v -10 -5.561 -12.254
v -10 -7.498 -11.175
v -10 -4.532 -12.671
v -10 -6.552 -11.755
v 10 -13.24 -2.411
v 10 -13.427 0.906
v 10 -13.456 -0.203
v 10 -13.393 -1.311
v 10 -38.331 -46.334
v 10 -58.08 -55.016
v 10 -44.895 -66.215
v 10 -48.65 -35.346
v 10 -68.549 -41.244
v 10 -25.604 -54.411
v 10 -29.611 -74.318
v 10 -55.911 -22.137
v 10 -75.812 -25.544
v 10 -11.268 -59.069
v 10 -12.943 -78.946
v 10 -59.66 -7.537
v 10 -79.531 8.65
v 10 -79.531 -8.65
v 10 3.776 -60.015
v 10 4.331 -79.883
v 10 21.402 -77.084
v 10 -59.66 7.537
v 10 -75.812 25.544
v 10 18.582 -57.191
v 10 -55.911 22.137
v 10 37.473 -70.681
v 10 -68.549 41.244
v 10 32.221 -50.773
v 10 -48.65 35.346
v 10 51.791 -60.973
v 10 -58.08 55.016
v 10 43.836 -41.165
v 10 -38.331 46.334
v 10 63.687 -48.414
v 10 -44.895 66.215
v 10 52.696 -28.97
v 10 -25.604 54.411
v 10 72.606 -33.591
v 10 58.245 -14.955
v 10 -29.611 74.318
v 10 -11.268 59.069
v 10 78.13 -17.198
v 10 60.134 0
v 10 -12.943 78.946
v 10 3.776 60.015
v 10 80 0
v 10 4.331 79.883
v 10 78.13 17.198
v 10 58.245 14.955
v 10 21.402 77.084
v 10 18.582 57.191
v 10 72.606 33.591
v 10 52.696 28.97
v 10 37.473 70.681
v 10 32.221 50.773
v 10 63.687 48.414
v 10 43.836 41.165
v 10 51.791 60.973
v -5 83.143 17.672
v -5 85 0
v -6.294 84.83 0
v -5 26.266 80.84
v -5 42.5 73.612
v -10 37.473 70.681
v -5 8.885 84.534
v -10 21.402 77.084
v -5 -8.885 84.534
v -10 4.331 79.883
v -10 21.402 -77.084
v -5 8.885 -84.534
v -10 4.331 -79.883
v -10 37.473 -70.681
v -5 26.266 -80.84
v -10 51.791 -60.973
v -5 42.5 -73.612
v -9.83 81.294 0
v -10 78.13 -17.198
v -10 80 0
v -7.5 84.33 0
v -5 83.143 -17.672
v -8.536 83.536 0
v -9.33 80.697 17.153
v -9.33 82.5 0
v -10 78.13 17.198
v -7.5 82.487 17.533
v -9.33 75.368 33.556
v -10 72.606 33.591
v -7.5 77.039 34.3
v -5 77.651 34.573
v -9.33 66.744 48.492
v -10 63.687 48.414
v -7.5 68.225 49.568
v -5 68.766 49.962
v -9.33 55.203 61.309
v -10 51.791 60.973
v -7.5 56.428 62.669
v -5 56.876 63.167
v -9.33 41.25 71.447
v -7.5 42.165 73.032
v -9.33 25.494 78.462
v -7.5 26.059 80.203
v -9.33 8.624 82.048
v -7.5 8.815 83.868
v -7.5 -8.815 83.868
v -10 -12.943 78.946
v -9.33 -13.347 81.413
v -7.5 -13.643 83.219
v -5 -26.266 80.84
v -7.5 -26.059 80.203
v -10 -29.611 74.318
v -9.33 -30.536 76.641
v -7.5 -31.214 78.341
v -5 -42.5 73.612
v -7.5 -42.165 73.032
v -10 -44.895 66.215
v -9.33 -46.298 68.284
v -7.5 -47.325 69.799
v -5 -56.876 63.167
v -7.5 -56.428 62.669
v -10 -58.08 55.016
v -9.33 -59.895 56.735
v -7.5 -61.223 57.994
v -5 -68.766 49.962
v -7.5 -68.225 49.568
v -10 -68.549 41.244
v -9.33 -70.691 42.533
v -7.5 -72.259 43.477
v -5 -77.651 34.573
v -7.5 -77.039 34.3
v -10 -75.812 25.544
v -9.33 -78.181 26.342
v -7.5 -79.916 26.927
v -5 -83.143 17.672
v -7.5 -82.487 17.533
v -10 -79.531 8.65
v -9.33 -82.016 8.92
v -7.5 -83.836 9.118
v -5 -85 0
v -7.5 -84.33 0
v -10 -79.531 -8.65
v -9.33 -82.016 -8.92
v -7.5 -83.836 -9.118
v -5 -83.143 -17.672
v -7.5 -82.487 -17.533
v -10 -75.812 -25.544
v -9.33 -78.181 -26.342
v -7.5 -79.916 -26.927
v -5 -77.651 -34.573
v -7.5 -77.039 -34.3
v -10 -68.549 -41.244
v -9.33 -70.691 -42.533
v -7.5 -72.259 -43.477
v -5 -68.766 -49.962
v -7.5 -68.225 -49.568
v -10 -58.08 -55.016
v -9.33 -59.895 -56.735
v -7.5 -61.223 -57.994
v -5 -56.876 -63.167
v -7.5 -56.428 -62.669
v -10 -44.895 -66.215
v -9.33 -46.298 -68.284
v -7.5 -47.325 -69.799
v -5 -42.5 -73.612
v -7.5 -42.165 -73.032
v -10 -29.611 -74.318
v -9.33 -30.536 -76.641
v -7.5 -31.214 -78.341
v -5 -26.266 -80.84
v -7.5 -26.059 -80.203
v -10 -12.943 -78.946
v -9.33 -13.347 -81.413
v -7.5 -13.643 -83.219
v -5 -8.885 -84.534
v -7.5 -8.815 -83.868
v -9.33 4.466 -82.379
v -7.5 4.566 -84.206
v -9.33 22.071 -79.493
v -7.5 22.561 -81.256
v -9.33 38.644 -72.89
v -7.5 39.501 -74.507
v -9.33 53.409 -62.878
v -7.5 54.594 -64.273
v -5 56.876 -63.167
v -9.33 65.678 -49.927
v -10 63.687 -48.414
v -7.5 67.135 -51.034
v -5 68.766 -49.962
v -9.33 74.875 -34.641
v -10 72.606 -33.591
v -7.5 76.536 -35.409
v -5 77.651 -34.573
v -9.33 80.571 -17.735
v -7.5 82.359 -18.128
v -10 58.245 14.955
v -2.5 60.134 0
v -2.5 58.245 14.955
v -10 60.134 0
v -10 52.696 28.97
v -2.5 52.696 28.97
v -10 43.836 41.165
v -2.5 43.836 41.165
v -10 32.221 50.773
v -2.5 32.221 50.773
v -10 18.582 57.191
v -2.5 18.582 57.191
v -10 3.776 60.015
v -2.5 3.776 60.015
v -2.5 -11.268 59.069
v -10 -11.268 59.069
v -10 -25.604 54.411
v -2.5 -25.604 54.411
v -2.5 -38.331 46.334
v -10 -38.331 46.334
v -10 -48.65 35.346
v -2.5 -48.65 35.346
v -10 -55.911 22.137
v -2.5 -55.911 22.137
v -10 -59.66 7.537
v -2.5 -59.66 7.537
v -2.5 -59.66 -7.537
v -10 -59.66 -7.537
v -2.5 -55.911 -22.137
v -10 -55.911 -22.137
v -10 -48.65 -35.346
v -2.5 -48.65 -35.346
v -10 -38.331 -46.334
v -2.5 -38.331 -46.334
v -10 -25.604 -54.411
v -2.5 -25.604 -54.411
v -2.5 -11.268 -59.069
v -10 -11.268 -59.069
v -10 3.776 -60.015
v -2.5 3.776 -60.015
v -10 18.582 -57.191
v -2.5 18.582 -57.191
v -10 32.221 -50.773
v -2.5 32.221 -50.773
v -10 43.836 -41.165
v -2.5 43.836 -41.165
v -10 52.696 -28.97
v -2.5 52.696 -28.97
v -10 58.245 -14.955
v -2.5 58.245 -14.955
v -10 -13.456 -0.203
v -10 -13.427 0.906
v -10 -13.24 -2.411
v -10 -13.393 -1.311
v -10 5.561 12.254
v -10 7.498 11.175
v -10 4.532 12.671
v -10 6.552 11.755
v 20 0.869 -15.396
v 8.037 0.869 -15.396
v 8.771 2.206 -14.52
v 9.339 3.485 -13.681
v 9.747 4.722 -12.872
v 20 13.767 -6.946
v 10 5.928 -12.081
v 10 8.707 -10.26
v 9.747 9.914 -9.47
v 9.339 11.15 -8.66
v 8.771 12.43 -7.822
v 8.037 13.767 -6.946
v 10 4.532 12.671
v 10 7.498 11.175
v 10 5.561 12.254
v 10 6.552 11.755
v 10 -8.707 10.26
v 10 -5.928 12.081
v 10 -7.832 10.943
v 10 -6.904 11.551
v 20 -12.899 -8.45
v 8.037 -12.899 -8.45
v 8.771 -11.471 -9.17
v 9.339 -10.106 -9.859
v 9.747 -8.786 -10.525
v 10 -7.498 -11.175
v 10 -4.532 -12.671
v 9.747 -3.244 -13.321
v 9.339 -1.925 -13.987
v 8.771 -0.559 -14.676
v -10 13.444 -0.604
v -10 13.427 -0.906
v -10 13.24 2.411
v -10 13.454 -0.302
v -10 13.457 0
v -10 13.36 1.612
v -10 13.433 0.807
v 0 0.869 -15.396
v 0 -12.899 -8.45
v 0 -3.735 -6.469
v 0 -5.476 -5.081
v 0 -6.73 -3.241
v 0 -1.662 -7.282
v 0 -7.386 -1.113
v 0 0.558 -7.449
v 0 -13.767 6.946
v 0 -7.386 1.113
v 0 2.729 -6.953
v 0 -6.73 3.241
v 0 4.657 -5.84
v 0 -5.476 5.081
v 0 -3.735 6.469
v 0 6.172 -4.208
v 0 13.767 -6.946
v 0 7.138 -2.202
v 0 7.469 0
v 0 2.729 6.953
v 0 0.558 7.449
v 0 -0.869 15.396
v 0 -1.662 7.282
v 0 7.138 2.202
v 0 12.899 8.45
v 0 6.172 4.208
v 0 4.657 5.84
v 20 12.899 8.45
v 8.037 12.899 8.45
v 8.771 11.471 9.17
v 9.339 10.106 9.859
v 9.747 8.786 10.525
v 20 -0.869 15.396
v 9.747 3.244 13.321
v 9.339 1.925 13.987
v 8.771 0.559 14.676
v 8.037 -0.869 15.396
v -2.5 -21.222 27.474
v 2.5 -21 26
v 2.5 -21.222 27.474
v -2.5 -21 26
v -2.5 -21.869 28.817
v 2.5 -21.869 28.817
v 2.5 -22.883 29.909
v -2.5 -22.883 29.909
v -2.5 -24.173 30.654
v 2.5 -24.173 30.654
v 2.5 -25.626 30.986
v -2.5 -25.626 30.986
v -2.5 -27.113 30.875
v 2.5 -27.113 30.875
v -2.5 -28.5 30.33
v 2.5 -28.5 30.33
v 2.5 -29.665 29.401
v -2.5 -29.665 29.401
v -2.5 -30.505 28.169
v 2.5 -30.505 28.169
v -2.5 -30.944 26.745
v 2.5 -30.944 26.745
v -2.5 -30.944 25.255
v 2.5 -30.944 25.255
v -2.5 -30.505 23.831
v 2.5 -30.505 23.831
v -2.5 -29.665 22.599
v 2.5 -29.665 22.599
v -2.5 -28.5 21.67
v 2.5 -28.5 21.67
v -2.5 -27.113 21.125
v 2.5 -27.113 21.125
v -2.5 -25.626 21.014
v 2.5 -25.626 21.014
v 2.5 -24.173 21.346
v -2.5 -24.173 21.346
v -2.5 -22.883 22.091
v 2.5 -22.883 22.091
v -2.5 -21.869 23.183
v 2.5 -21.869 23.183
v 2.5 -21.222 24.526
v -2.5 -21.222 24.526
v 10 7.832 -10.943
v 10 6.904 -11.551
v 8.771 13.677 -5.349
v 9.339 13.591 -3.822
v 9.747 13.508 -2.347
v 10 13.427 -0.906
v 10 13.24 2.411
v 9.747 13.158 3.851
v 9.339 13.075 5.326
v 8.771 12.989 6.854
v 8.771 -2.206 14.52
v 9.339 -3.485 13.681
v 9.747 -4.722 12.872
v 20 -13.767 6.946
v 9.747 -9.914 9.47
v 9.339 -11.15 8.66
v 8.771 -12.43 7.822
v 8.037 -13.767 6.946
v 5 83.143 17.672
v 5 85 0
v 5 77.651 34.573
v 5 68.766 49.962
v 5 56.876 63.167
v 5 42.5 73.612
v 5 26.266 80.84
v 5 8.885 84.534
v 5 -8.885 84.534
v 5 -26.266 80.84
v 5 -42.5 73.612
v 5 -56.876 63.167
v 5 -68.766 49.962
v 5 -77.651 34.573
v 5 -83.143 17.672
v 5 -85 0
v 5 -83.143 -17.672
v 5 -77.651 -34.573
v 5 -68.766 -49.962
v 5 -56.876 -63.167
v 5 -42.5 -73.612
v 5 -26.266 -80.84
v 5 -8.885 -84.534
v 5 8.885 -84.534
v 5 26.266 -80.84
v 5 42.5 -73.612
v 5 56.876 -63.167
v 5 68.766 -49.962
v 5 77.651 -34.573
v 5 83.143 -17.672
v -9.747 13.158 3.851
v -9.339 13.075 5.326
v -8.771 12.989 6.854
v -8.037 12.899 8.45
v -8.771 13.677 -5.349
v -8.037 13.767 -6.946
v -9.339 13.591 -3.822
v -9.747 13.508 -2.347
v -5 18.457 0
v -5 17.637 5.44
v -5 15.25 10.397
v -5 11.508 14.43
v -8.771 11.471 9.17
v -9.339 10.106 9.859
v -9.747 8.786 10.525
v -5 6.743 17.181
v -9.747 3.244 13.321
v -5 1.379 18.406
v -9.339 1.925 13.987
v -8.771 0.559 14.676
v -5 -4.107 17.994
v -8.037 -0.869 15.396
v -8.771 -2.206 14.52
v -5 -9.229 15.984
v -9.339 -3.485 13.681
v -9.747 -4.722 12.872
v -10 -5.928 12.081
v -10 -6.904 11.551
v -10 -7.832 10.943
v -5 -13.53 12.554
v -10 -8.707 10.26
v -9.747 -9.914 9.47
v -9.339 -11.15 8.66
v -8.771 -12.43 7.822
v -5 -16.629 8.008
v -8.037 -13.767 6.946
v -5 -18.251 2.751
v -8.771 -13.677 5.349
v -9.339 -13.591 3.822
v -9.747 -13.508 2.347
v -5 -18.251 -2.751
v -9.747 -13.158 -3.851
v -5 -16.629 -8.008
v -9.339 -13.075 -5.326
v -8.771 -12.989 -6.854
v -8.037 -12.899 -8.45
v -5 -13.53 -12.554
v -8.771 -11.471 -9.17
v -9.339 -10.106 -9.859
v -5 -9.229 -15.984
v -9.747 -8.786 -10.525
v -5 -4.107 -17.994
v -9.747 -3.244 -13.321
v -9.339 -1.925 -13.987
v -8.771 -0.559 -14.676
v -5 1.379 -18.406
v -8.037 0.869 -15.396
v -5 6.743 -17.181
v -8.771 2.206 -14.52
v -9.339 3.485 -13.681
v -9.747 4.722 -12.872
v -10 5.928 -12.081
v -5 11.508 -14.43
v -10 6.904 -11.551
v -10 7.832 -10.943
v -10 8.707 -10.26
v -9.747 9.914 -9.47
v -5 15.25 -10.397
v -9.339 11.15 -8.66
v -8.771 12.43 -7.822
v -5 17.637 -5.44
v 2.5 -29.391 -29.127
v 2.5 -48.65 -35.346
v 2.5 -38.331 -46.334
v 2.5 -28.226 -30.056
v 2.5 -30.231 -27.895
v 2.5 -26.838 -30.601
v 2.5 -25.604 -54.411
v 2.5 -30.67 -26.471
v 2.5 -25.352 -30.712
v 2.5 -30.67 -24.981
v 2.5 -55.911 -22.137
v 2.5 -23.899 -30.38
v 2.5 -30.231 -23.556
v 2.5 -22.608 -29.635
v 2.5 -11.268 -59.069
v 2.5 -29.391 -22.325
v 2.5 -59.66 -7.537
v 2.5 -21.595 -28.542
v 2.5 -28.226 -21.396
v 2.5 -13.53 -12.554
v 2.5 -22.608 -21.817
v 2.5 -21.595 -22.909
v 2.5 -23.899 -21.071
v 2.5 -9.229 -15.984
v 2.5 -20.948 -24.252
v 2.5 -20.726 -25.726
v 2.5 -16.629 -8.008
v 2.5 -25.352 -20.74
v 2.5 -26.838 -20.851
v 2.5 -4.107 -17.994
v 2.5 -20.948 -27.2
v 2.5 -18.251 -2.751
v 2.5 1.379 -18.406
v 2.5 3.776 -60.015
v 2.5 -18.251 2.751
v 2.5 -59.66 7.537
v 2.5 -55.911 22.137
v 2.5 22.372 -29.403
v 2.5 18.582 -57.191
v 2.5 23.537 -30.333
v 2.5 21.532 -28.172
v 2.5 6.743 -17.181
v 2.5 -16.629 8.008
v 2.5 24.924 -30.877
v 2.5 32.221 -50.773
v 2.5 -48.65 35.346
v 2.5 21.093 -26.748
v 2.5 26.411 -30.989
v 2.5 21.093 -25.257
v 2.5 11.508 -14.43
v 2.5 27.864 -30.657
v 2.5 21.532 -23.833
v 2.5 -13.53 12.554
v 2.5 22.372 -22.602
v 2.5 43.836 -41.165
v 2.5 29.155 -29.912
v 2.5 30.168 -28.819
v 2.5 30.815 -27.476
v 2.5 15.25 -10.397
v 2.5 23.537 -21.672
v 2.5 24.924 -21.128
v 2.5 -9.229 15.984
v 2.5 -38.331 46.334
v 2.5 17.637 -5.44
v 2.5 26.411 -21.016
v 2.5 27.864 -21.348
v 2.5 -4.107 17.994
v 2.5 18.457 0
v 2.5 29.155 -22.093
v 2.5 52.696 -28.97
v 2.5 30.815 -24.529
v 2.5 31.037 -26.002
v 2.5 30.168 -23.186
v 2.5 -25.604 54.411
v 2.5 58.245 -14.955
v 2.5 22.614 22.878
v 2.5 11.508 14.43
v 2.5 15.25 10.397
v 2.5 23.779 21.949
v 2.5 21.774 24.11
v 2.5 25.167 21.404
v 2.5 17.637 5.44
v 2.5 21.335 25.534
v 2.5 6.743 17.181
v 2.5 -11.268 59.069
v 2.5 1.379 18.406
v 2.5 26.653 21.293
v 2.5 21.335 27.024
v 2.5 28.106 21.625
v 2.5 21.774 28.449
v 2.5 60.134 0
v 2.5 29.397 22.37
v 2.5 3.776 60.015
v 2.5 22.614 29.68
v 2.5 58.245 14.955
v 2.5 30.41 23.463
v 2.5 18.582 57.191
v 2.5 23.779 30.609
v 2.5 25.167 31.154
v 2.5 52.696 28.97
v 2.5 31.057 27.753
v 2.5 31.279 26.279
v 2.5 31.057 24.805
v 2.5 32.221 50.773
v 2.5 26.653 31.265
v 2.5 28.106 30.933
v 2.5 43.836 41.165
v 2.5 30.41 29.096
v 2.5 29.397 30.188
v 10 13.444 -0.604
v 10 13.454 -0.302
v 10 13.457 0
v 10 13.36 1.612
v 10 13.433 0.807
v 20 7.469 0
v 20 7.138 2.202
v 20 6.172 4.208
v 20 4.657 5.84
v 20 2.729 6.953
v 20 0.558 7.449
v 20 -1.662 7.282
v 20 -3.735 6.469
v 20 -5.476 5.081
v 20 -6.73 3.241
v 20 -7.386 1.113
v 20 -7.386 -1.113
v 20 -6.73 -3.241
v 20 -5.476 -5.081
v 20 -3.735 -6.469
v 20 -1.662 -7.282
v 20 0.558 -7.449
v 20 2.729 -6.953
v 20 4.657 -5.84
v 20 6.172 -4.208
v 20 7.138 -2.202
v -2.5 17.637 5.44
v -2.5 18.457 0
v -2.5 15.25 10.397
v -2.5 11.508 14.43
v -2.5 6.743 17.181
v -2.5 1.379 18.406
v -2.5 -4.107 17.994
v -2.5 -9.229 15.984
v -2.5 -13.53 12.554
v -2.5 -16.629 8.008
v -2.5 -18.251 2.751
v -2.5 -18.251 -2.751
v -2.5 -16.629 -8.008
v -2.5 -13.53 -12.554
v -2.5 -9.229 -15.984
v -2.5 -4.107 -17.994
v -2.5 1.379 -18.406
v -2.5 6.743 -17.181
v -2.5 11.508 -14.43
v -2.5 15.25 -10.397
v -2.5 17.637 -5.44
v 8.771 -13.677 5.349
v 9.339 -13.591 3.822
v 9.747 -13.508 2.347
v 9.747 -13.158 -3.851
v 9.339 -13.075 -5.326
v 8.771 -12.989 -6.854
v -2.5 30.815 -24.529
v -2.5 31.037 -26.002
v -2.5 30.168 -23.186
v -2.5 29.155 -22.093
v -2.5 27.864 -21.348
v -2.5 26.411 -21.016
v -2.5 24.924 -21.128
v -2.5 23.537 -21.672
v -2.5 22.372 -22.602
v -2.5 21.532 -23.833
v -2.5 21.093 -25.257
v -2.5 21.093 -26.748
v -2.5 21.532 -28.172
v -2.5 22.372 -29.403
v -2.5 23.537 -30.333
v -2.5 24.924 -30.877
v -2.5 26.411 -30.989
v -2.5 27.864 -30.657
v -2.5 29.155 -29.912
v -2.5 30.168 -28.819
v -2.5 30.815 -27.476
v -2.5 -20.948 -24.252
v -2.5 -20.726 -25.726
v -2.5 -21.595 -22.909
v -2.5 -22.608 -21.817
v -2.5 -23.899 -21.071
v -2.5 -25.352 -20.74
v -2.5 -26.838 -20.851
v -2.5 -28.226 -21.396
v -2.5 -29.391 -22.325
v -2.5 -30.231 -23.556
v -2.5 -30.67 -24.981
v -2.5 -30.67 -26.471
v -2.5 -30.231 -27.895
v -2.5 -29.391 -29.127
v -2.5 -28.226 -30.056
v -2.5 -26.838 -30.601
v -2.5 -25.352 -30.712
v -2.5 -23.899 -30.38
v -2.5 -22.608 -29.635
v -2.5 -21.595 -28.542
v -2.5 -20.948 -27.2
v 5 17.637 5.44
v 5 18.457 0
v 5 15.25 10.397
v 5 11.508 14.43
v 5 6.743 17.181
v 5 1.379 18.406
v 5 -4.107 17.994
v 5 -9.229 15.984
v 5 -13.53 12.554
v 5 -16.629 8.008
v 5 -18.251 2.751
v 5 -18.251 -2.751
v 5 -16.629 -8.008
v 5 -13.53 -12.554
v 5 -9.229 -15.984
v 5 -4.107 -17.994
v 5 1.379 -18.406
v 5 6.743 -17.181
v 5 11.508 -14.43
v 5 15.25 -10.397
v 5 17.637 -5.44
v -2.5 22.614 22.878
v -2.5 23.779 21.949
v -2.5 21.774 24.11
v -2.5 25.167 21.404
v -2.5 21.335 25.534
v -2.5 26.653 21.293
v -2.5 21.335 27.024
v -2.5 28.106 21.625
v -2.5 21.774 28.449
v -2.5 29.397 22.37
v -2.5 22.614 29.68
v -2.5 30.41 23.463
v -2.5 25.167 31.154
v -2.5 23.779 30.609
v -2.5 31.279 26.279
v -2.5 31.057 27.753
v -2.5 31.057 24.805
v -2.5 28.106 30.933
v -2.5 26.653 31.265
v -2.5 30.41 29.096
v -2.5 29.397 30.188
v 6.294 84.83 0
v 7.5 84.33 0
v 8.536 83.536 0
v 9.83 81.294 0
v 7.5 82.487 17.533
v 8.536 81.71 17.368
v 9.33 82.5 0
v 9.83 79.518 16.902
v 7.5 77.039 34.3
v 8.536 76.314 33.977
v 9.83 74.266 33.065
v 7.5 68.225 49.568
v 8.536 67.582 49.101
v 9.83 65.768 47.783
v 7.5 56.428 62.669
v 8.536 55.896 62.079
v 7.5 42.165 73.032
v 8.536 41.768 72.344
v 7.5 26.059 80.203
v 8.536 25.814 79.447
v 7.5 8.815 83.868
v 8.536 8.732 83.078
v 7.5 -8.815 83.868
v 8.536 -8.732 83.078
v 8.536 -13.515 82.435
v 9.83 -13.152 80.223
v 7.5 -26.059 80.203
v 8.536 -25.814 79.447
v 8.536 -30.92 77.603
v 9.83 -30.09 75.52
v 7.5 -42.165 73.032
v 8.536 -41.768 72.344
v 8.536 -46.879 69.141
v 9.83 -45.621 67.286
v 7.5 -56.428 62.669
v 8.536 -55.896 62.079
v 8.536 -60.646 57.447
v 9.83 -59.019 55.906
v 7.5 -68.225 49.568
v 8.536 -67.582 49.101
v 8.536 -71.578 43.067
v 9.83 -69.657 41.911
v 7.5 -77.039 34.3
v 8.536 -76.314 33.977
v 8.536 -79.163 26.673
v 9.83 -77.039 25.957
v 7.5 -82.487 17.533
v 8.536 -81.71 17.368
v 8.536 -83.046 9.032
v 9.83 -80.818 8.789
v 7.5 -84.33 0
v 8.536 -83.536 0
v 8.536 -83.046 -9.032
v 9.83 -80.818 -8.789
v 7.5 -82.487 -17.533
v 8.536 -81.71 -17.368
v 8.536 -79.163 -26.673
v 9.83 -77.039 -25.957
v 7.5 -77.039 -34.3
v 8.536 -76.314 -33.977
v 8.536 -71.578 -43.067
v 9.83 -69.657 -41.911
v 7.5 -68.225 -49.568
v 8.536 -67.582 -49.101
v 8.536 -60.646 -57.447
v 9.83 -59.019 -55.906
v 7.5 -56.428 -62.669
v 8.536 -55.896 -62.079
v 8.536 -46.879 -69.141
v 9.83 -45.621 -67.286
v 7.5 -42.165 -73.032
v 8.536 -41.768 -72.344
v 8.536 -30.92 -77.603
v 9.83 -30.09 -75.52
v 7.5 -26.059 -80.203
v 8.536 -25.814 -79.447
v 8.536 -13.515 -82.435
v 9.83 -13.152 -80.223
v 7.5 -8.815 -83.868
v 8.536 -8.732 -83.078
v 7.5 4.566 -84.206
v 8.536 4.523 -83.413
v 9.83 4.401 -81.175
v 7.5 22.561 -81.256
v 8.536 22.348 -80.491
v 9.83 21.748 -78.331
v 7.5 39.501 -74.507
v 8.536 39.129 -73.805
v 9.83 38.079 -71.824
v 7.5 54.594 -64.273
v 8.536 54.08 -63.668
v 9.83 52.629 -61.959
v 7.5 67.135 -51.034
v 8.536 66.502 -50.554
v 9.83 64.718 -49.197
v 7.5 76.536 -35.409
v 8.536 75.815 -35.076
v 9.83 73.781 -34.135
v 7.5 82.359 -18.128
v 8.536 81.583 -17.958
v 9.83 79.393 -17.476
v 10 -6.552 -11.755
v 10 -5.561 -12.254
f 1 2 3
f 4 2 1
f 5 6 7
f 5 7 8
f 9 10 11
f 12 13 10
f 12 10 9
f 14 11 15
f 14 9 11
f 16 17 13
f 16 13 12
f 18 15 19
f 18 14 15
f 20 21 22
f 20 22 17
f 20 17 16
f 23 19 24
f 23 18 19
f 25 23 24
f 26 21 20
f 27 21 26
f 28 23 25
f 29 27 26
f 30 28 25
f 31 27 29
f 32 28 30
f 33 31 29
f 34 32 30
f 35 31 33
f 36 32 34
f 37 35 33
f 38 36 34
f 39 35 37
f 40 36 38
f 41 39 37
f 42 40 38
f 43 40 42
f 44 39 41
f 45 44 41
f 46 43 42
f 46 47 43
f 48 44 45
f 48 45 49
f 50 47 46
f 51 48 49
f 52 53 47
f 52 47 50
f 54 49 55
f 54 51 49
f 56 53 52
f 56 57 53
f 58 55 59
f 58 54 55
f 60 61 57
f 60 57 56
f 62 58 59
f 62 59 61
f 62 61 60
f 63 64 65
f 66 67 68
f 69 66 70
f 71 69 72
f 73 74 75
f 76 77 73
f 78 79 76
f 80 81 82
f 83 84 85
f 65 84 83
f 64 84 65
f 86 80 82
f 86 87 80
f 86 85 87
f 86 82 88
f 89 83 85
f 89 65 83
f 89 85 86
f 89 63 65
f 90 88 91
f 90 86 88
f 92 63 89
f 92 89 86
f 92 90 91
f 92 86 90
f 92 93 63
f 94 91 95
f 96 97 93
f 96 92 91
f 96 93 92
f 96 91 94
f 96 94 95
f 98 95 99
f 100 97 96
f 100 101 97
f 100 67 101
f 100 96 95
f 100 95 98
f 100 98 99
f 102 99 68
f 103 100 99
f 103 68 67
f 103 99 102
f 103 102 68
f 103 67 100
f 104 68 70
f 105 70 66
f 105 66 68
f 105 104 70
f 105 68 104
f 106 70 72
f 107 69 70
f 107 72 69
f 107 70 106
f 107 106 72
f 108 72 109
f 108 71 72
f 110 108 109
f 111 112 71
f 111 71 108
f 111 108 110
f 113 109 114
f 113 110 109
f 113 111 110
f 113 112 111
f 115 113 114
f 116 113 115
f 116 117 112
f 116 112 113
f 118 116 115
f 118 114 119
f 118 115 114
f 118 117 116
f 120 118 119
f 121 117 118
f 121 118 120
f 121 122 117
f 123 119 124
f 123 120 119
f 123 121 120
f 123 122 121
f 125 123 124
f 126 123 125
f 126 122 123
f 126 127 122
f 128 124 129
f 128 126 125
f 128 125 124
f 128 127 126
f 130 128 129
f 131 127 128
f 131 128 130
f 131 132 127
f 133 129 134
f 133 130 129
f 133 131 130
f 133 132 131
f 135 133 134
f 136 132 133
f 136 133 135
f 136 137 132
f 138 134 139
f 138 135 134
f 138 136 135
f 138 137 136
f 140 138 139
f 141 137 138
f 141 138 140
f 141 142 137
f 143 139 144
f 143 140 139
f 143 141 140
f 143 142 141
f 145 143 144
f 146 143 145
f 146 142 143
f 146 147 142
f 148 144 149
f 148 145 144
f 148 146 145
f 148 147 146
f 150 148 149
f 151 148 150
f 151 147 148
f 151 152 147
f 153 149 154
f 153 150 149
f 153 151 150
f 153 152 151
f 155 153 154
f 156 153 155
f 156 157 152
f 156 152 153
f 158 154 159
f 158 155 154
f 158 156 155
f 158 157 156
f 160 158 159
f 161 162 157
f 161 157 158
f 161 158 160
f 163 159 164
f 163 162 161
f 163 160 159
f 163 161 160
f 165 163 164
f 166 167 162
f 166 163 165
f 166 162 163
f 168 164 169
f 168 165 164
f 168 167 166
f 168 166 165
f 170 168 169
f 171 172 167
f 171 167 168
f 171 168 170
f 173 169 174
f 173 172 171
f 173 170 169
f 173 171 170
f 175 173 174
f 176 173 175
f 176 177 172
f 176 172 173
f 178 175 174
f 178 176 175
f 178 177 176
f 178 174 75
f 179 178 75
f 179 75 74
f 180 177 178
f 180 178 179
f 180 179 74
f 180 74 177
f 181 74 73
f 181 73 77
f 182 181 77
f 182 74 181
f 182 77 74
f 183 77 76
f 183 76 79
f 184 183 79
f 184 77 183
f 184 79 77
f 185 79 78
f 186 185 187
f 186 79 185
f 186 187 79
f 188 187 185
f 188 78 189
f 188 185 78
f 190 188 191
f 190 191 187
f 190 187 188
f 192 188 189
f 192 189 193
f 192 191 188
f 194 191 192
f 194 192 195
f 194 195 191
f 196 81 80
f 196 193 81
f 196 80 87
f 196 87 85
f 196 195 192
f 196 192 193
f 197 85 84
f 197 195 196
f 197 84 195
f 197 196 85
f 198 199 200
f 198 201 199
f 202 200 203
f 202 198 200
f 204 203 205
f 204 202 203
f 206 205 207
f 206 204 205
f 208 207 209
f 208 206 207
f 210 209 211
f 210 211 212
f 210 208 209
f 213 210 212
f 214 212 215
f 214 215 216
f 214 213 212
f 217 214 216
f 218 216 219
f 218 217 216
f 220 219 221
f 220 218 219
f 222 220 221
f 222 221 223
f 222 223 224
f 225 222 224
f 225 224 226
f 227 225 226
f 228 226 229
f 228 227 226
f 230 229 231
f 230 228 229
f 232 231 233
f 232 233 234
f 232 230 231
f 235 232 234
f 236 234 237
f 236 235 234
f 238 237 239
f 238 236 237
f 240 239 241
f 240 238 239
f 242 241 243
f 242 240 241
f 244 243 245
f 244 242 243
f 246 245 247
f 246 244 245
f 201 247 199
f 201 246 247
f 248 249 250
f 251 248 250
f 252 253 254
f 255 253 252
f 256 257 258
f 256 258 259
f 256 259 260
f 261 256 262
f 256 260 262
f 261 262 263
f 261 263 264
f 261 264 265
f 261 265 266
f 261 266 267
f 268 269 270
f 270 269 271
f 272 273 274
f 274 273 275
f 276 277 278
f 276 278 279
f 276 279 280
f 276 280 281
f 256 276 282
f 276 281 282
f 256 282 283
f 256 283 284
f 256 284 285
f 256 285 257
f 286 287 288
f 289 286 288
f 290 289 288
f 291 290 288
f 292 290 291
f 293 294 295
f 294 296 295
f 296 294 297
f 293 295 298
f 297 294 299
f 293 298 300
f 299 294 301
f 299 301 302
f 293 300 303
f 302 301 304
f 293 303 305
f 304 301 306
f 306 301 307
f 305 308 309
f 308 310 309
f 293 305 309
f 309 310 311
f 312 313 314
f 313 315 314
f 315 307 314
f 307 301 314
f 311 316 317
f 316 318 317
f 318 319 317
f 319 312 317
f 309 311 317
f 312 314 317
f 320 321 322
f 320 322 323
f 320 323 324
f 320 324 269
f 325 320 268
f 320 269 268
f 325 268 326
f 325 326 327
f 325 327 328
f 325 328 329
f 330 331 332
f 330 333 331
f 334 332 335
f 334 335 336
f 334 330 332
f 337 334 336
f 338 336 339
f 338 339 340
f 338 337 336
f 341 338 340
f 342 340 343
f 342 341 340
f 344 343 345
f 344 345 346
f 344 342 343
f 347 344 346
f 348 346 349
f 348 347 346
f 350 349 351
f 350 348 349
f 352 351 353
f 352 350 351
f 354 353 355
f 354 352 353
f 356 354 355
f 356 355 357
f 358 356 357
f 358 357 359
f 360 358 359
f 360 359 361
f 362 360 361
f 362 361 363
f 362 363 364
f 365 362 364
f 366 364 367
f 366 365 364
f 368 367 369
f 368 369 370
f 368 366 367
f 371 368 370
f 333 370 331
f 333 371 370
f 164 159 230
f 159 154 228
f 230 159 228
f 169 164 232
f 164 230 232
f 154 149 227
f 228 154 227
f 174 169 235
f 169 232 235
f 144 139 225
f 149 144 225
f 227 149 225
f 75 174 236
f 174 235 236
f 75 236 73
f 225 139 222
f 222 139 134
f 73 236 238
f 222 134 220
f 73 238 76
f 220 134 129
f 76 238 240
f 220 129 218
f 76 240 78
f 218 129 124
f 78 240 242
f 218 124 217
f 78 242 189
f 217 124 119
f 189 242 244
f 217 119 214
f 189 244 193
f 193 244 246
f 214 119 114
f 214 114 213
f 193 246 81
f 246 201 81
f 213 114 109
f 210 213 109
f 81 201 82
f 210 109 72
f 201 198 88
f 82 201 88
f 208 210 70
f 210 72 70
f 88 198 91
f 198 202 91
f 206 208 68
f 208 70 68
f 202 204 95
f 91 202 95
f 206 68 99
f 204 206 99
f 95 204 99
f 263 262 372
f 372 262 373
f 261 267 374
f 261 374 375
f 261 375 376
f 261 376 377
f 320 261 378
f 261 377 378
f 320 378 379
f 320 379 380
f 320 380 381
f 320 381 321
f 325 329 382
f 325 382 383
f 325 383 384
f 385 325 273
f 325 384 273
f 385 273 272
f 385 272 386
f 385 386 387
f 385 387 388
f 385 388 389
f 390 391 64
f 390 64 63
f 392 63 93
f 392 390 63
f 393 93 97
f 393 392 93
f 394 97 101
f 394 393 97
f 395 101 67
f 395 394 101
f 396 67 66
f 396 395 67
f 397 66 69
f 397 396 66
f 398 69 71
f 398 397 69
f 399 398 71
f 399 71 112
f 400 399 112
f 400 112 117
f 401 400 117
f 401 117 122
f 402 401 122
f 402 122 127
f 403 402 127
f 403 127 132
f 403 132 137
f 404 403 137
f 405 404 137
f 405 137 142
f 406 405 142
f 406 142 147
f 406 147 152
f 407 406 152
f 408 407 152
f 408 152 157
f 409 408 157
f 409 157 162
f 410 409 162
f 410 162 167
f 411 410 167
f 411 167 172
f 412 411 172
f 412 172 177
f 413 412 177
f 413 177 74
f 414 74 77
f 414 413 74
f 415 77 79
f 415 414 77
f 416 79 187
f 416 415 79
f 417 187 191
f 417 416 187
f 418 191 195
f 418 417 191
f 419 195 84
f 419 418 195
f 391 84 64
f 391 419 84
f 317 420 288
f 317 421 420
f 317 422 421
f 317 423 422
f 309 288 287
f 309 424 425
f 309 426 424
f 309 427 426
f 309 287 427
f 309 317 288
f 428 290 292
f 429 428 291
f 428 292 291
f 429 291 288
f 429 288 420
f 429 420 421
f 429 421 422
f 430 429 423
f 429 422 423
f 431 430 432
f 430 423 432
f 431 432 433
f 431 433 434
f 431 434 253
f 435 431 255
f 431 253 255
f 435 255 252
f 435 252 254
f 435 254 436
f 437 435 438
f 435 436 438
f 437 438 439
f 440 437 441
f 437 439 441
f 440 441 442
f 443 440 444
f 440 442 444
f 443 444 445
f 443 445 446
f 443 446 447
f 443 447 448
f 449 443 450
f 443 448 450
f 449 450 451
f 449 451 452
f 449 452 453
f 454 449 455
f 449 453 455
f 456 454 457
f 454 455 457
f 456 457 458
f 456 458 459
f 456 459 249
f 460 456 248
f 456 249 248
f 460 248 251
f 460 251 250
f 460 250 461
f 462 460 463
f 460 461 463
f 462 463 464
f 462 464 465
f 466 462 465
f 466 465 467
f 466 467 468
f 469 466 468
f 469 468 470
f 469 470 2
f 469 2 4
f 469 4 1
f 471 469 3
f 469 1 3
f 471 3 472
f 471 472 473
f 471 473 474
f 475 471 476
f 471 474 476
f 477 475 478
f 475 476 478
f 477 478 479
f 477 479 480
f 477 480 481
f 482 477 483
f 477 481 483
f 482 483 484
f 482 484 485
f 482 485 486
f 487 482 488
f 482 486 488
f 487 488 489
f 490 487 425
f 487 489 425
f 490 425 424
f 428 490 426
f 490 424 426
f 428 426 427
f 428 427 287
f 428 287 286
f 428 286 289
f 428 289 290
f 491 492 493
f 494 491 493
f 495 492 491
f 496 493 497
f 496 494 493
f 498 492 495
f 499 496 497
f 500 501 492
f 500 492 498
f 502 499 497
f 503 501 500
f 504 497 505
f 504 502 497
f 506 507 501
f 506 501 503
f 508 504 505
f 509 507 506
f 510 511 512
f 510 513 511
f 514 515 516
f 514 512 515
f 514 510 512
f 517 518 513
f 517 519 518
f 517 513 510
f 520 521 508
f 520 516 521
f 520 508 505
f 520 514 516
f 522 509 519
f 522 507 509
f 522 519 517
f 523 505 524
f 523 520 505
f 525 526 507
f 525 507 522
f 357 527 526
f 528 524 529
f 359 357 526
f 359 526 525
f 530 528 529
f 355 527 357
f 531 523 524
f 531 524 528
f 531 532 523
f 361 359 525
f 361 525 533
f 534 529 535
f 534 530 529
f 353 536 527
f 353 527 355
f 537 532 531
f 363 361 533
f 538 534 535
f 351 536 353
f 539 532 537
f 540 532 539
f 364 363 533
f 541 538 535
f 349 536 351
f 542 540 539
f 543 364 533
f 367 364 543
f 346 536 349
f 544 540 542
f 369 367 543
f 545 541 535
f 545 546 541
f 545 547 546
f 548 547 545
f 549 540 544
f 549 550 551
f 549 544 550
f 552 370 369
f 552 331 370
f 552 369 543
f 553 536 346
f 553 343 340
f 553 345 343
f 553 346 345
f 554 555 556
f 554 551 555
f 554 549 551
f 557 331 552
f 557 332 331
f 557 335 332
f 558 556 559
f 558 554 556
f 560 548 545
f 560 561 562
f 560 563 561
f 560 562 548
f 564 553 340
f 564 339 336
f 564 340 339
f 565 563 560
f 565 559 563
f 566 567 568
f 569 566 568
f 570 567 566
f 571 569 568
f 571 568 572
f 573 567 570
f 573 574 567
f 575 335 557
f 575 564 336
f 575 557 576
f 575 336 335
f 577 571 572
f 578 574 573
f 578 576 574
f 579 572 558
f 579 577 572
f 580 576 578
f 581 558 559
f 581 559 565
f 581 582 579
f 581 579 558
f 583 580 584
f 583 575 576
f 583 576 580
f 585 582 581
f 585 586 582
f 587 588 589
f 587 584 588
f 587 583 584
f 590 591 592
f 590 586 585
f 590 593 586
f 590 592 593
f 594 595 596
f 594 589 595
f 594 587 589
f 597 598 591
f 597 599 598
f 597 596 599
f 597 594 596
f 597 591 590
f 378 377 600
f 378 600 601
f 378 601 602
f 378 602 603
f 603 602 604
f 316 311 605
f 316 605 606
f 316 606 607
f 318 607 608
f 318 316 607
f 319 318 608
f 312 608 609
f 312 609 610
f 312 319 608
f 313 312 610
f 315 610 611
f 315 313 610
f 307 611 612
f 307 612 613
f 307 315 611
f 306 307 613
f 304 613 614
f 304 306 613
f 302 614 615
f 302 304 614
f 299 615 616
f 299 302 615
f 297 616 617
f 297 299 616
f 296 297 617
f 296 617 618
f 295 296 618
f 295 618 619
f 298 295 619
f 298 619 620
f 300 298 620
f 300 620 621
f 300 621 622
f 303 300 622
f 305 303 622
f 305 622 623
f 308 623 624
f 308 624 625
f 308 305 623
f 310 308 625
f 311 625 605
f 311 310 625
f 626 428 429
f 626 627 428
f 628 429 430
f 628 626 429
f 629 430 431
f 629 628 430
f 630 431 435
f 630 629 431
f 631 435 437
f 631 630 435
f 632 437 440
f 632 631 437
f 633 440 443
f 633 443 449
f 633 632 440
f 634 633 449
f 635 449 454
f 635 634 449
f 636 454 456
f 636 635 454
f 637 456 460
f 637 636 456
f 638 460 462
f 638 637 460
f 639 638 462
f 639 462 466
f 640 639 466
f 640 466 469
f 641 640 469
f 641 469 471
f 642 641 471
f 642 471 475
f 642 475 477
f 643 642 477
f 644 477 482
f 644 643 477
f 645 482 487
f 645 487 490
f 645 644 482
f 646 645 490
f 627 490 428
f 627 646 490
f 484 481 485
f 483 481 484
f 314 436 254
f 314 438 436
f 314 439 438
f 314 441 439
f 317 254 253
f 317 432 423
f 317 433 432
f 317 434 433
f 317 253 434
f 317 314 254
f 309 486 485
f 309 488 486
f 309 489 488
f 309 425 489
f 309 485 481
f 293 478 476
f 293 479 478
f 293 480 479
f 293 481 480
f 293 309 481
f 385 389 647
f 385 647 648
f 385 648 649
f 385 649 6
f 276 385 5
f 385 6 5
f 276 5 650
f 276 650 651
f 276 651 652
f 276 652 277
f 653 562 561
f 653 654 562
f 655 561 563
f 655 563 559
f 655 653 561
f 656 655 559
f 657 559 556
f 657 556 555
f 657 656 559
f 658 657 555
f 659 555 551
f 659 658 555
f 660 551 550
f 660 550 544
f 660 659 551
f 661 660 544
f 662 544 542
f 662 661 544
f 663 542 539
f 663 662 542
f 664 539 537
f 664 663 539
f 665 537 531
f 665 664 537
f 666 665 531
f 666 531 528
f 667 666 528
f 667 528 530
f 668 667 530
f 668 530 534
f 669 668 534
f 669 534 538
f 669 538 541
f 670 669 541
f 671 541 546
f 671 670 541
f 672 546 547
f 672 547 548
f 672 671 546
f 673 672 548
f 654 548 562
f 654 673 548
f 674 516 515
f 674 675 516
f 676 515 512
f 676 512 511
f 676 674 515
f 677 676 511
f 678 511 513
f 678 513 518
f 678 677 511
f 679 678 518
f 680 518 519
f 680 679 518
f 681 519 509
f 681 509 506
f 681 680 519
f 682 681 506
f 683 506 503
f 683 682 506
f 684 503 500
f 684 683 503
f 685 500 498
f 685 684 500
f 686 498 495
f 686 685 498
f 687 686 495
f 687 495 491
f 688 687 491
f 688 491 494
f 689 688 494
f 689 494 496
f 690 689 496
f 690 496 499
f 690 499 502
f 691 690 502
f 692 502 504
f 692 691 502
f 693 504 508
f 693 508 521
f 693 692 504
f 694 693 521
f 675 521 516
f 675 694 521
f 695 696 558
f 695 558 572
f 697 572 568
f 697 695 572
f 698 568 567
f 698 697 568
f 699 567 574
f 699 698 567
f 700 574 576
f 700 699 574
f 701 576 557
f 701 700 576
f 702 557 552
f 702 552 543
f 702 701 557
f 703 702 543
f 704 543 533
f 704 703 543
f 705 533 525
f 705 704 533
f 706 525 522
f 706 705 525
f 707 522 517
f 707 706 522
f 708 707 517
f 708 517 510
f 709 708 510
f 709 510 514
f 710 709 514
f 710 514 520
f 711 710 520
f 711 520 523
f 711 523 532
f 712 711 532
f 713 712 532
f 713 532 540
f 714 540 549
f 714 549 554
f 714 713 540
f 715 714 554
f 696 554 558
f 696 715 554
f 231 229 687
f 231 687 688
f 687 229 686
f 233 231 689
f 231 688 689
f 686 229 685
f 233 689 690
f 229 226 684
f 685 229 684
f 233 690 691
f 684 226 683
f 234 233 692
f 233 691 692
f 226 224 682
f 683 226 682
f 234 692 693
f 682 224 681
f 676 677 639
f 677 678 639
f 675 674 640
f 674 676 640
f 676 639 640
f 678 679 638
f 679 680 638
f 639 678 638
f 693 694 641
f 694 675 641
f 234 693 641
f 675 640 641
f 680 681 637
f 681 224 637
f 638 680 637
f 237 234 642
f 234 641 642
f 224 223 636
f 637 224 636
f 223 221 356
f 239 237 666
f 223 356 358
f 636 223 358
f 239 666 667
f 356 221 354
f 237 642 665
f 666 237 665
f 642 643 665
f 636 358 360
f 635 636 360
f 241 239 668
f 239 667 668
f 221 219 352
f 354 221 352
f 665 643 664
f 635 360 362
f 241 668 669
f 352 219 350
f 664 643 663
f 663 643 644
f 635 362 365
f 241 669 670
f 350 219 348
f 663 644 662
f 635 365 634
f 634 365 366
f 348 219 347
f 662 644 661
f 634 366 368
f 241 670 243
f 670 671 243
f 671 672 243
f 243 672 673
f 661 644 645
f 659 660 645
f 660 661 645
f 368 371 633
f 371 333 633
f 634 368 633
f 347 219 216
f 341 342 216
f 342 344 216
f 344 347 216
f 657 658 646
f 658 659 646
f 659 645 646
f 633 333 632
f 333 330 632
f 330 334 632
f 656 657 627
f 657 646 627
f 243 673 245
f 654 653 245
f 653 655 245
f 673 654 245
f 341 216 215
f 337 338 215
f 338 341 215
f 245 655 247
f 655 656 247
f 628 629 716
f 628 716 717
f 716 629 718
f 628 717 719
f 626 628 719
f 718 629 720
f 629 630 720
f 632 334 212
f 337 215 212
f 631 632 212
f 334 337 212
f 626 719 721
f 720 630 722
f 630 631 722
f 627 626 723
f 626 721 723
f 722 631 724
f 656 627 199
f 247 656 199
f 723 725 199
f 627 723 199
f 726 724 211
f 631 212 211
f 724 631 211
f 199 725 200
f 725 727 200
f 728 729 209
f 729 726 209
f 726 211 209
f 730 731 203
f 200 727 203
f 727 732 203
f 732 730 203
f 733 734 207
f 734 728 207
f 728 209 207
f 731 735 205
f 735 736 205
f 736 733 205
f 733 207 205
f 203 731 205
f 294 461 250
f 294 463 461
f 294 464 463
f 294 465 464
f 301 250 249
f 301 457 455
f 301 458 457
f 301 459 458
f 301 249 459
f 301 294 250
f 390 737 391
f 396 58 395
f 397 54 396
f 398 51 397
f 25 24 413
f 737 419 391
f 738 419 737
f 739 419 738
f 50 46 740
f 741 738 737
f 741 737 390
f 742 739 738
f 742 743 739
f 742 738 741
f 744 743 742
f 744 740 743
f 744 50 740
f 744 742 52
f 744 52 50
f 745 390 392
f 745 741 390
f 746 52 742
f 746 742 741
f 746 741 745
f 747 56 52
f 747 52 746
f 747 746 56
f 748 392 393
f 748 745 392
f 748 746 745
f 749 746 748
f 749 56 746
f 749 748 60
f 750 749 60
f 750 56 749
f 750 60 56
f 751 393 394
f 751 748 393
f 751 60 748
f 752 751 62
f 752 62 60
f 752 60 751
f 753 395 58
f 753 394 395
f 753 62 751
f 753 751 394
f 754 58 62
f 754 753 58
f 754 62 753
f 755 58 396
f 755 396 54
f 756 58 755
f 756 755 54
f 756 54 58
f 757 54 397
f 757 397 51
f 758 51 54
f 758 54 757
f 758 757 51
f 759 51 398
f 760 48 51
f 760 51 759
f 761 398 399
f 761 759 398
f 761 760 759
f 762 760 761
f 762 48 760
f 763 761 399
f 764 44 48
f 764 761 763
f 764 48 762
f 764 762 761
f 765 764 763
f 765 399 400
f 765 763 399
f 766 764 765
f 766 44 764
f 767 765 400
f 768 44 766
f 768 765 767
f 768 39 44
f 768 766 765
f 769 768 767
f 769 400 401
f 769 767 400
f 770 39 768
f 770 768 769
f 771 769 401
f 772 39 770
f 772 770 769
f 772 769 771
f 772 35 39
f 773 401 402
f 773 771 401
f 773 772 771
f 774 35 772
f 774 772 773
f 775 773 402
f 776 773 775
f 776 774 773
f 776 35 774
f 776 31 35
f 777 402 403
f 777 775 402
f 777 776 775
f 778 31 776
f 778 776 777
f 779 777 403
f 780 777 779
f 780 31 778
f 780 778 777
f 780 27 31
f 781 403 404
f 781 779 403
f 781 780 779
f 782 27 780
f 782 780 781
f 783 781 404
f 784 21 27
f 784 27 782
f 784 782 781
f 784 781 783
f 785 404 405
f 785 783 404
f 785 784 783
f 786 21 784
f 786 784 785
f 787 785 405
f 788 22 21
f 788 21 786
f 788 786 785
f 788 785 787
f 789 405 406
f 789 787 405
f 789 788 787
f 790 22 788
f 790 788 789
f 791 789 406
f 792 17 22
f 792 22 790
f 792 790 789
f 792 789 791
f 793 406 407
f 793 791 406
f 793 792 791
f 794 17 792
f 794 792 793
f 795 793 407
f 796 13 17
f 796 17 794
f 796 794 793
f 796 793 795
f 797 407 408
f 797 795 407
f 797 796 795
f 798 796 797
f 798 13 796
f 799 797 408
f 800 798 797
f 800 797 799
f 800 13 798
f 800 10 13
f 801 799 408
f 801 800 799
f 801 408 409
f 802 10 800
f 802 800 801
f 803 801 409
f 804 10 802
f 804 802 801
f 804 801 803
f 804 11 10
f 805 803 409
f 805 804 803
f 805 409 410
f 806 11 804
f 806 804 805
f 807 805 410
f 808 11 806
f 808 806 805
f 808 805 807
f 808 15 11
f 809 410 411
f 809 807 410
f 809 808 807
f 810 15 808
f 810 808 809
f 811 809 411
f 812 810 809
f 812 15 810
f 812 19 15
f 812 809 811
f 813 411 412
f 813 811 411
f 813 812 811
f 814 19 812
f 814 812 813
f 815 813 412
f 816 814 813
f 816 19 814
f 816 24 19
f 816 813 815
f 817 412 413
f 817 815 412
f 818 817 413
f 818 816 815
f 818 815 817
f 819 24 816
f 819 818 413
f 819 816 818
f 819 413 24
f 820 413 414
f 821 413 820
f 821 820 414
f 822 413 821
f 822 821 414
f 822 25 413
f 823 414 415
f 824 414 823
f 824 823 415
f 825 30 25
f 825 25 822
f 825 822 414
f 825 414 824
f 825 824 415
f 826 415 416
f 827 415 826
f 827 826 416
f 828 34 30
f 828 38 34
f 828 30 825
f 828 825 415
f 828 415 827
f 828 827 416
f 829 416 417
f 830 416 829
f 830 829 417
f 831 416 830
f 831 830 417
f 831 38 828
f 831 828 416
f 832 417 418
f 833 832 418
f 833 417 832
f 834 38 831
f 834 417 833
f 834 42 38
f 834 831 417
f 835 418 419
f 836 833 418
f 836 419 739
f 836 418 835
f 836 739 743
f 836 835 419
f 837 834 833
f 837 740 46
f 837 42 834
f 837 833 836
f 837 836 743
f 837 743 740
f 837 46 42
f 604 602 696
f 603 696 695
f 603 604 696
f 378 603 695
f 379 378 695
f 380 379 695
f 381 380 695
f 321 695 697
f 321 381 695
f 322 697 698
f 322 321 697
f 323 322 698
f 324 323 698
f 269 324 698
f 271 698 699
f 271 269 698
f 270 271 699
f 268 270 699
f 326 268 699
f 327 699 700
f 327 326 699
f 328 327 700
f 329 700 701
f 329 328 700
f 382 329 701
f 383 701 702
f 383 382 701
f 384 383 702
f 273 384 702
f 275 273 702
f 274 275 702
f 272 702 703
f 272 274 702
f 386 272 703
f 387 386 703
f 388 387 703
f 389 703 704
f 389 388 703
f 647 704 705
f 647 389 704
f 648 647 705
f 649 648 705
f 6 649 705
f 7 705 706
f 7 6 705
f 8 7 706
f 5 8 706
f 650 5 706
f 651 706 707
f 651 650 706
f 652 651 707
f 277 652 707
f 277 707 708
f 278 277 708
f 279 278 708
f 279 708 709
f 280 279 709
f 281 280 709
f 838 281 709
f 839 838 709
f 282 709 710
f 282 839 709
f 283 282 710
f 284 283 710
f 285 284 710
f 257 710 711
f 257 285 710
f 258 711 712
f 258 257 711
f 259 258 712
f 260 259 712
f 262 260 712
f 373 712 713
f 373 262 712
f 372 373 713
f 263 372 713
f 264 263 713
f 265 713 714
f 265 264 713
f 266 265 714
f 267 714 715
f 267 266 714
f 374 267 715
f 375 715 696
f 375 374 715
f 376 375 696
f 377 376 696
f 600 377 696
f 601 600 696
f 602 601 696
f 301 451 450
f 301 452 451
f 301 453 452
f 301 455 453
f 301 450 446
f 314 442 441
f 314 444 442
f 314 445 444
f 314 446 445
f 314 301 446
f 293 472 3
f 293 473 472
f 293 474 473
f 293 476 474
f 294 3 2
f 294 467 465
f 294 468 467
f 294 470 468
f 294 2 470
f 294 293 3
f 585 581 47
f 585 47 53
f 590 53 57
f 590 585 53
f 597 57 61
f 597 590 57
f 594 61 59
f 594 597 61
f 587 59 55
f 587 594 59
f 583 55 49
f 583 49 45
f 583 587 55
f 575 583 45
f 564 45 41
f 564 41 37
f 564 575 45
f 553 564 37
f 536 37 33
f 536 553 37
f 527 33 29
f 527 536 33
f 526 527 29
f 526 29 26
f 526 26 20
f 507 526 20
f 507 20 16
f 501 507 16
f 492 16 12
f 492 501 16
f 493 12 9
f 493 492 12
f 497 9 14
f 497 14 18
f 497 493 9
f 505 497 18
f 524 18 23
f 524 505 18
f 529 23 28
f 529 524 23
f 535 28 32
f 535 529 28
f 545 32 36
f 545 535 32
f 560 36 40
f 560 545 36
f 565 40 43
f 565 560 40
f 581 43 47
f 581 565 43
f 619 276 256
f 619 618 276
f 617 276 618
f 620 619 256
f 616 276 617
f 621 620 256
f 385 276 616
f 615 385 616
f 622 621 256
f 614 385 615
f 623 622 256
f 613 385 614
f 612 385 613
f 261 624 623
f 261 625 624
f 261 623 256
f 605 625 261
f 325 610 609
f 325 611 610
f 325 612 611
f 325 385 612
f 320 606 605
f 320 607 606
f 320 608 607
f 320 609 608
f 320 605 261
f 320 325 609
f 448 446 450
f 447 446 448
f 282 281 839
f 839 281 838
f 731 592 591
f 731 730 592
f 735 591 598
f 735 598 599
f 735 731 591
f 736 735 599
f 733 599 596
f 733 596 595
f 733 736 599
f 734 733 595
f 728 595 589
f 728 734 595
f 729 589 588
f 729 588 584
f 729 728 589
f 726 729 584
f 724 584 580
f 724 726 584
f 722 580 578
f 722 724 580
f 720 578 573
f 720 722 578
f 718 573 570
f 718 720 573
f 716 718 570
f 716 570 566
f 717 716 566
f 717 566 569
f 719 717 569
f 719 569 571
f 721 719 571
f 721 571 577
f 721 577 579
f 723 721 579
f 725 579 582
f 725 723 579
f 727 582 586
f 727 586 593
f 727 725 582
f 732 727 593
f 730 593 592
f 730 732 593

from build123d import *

# Parameters (mm, degrees)
F0_R     = 85
F0_R_2   = 60.1341050947
F1_DEPTH = 10
F0_R_3   = 5
F0_R_4   = 18.4571799951
F2_DEPTH = 2.5
F3_DEPTH = 10
F4_R     = 5
F0_R_5   = 7.4694808043
F6_DEPTH = 20


# Not quite as in the source:
# - a fillet or chamfer that OpenCascade refuses, or shapes differently, is made with other operations: its cross-section is extruded or revolved along the edge and cut away or added


with BuildPart() as f1:
    # F0 (on Right) → F1 (new body, symmetric)
    with BuildSketch(Plane.YZ):
        Circle(F0_R)
        Circle(F0_R_2, mode=Mode.SUBTRACT)
    extrude(amount=F1_DEPTH, both=True)

    # F0 (on Right) → F2 (join, symmetric)
    with BuildSketch(Plane.YZ):
        Circle(F0_R_2)
        with Locations((-25.7258657366, -25.725863874)):
            Circle(F0_R_3, mode=Mode.SUBTRACT)
        with Locations((26.0370634496, -26.0024871677)):
            Circle(F0_R_3, mode=Mode.SUBTRACT)
        with Locations((-26, 26)):
            Circle(F0_R_3, mode=Mode.SUBTRACT)
        Circle(F0_R_4, mode=Mode.SUBTRACT)
        with Locations((26.2791067362, 26.2791085988)):
            Circle(F0_R_3, mode=Mode.SUBTRACT)
    extrude(amount=F2_DEPTH, both=True)

    # F0 (on Right) → F3 (join, symmetric)
    with BuildSketch(Plane.YZ):
        Circle(F0_R_4)
        Polygon((12.8988242803, 8.4499999602), (13.7673267676, -6.9457095256), (0.8685024874, -15.3957094858), (-12.8988242803, -8.4499999602), (-13.7673267676, 6.9457095256), (-0.8685024874, 15.3957094858), align=None, mode=Mode.SUBTRACT)
    extrude(amount=F3_DEPTH, both=True)

    # F4
    f4_edges = [f1.edges().sort_by_distance(p)[0] for p in [
        (-10, -85, 0),
        (10, -85, 0),
    ]]
    fillet(f4_edges, radius=F4_R)

    # F5: chamfer of 5 on 2 edges, made by hand

    # F5_s1 → F5_t2 (revolve, cut)
    with BuildSketch(Plane.XY):
        Polygon((5, 18.4571799951), (10, 13.4571799951), (10, 18.4571799951), align=None)
    revolve(axis=Axis((10, 0, 0), (1, 0, 0)), mode=Mode.SUBTRACT)

    # F5_s3 → F5_t4 (revolve, cut)
    with BuildSketch(Plane.XY):
        Polygon((-5, 18.4571799951), (-10, 13.4571799951), (-10, 18.4571799951), align=None)
    revolve(axis=Axis((-10, 0, 0), (1, 0, 0)), mode=Mode.SUBTRACT)

    # F0 (on Right) → F6 (join)
    with BuildSketch(Plane.YZ):
        Polygon((0.8685024874, -15.3957094858), (13.7673267676, -6.9457095256), (12.8988242803, 8.4499999602), (-0.8685024874, 15.3957094858), (-13.7673267676, 6.9457095256), (-12.8988242803, -8.4499999602), align=None)
        Circle(F0_R_5, mode=Mode.SUBTRACT)
    extrude(amount=F6_DEPTH)


solid = f1.part
